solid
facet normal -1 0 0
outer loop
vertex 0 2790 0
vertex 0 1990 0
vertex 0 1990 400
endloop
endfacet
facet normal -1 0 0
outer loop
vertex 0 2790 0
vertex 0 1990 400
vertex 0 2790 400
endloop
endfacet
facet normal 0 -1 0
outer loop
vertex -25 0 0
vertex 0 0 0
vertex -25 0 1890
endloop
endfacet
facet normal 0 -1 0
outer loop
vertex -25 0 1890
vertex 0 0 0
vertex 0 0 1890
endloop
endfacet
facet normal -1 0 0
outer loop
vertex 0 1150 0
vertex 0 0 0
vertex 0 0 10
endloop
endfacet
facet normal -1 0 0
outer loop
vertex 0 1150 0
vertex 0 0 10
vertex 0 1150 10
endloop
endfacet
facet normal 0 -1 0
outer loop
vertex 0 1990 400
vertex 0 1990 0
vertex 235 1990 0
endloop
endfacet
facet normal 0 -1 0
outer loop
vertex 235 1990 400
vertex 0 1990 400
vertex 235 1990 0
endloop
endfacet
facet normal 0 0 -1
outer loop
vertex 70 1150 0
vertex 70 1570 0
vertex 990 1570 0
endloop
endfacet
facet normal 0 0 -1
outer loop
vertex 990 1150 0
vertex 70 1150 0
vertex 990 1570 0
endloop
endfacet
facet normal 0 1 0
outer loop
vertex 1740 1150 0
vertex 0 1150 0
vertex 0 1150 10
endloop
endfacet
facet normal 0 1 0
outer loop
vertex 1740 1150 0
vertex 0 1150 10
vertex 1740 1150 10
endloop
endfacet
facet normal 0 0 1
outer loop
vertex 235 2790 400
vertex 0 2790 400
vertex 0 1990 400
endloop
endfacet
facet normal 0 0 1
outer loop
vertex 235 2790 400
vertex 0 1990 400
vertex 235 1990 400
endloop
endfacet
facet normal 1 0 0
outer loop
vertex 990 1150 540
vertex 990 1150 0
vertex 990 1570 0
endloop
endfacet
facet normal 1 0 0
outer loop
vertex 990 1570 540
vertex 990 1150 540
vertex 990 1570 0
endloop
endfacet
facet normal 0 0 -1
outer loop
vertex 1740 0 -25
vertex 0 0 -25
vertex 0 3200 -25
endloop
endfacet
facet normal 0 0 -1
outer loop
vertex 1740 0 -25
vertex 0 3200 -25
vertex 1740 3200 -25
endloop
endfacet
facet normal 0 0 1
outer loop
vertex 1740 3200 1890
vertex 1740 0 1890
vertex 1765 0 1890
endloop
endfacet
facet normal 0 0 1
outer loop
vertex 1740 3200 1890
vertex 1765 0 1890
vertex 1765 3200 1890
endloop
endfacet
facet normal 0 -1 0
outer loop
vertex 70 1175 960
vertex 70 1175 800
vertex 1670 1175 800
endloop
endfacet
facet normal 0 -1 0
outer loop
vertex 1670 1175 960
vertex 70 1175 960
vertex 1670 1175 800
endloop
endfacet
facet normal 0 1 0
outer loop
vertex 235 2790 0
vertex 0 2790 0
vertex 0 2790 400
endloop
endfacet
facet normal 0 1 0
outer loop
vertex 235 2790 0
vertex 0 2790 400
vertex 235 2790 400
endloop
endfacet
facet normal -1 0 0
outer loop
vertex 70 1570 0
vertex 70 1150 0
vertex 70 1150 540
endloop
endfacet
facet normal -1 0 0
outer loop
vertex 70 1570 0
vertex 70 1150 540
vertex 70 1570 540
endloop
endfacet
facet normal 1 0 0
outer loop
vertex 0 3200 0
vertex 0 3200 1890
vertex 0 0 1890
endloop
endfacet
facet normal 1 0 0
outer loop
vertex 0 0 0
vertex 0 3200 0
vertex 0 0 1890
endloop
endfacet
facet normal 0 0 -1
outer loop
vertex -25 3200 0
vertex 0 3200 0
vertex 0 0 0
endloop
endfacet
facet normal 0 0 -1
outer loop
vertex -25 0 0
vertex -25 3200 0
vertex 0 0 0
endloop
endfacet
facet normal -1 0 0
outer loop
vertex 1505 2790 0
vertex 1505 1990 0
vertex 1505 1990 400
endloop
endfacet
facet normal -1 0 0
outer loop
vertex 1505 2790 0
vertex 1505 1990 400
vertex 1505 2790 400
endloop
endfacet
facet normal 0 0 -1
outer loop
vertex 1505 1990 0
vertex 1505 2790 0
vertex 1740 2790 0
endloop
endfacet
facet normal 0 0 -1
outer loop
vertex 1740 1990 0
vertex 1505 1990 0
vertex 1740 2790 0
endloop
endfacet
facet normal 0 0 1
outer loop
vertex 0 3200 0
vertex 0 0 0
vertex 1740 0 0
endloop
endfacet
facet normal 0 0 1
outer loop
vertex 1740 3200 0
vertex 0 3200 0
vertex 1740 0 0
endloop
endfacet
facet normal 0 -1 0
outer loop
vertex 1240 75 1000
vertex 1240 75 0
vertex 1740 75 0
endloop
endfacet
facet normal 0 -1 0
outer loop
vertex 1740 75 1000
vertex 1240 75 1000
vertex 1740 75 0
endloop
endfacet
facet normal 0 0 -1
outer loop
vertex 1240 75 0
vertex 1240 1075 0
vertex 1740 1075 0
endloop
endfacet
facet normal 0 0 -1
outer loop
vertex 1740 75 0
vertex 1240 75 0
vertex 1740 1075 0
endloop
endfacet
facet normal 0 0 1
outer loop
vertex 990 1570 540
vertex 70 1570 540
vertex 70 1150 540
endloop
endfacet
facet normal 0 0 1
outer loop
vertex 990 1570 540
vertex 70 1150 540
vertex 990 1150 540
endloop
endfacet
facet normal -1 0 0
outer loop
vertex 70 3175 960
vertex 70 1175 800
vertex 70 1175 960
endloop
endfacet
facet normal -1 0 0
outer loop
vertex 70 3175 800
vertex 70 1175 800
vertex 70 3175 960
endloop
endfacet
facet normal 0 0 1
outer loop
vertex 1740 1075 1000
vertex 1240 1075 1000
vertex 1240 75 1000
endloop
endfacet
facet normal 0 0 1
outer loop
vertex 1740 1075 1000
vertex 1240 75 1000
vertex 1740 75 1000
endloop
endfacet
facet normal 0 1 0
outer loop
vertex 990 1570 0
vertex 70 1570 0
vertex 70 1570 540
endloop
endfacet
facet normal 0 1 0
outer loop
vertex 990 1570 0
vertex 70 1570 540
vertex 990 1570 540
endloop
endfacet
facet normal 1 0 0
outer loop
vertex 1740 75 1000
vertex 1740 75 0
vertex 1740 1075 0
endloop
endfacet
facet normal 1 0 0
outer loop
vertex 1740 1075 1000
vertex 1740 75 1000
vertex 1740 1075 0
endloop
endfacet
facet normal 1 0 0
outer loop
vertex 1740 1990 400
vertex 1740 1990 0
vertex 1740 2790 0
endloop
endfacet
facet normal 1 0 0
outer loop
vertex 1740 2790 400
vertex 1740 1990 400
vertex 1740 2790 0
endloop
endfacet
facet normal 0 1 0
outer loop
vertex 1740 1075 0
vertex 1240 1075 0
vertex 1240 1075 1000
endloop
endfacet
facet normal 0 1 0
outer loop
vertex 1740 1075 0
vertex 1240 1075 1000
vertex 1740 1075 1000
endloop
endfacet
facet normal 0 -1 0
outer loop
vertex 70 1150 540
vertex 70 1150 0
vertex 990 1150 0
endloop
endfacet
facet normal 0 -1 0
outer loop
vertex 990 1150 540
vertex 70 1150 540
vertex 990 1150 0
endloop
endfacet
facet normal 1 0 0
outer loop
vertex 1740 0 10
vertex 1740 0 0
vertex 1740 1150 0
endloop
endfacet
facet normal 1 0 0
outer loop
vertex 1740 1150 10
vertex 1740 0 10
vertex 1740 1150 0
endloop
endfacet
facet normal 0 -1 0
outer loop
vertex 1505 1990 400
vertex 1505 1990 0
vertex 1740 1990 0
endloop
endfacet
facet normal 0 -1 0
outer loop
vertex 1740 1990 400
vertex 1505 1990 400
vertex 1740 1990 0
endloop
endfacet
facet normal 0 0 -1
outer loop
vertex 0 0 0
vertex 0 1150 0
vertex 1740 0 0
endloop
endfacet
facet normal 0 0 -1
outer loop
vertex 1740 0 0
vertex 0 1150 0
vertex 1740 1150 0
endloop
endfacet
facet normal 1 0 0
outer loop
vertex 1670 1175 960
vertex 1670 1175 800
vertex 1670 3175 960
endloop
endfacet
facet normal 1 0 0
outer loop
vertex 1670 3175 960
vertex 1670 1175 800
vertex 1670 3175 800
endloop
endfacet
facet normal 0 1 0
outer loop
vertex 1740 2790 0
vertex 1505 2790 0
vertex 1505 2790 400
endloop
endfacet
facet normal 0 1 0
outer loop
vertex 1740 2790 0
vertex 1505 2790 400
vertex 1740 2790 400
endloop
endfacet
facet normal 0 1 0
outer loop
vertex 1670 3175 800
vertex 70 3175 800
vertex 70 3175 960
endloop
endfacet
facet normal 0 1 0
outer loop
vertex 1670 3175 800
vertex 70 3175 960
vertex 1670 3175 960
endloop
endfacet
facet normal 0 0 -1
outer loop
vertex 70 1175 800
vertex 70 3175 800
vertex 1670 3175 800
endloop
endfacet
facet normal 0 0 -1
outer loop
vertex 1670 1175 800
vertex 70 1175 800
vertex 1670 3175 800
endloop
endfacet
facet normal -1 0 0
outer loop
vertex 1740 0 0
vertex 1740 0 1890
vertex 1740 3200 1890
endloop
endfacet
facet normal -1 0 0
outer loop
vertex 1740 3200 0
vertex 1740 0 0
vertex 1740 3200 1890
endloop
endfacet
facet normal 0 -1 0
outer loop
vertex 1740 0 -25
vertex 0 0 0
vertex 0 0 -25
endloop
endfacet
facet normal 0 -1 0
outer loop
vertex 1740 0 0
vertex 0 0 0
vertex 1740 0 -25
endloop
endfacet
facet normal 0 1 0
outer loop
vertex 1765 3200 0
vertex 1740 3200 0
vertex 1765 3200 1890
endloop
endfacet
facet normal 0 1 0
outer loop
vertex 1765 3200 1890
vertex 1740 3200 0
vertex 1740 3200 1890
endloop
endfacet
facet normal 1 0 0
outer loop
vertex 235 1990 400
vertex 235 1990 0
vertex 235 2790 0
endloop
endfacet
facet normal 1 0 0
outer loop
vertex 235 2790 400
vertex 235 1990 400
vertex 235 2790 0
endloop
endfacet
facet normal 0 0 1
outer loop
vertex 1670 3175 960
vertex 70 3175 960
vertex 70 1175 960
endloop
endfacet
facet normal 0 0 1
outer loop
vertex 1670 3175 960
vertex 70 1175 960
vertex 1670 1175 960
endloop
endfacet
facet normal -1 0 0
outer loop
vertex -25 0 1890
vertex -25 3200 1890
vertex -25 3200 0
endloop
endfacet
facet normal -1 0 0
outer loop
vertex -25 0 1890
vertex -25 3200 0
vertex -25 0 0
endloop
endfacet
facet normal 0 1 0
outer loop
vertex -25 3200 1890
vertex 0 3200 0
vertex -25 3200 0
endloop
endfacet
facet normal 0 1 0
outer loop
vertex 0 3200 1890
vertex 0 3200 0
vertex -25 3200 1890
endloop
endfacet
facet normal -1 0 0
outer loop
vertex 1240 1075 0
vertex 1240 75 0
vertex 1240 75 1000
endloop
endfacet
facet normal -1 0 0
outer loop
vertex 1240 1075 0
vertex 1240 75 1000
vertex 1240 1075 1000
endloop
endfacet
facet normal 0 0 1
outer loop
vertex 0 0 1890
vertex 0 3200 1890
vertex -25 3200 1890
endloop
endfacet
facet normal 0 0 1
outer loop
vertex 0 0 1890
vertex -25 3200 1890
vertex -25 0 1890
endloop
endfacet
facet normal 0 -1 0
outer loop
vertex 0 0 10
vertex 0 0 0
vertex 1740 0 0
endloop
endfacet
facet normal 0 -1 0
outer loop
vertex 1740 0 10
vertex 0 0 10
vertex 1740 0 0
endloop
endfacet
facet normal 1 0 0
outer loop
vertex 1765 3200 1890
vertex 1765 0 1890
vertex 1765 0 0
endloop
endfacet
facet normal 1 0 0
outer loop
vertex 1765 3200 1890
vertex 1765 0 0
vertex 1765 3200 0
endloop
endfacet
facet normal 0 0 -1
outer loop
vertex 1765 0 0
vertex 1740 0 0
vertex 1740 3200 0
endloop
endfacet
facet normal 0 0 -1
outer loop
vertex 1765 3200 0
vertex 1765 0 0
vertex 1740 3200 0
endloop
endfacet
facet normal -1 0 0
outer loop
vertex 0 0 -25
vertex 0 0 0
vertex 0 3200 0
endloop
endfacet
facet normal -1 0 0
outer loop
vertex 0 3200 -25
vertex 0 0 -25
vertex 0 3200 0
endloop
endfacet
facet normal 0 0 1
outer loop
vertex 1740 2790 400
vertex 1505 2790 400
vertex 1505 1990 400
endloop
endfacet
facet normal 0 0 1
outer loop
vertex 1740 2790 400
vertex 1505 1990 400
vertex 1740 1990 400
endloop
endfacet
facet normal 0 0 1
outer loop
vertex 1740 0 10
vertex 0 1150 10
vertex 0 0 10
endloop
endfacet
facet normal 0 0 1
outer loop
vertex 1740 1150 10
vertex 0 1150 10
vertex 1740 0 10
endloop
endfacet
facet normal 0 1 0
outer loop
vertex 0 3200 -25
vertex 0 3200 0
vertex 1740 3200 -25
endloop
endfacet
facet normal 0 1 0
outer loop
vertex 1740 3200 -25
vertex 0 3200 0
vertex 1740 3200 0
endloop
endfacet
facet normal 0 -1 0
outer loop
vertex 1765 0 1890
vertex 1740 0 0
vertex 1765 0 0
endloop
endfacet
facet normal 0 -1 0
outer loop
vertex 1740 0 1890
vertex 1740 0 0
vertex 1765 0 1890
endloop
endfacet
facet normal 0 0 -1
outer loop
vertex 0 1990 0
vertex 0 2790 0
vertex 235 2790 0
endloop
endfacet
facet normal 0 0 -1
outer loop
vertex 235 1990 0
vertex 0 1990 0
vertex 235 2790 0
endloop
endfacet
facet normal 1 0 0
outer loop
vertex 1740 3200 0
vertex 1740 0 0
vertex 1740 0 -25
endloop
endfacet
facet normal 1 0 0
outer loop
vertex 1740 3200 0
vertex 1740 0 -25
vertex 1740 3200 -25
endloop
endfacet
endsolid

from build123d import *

# Parameters (mm, degrees)
F0_W      = 1740
F0_H      = 3200
F1_DEPTH  = 25
F2_W      = 3200
F2_H      = 1890
F4_DEPTH  = 25
F3_W      = 3200
F3_H      = 1890
F5_DEPTH  = 25
F6_W      = 1740
F6_H      = 1150
F7_DEPTH  = 10
F8_W      = 235
F8_H      = 800
F9_DEPTH  = 400
F10_W     = 235
F10_H     = 800
F11_DEPTH = 400
F13_W     = 1600
F13_H     = 2000
F14_DEPTH = 160
F15_W     = 500
F15_H     = 1000
F16_DEPTH = 1000
F17_W     = 920
F17_H     = 420
F18_DEPTH = 540


with BuildPart() as f1:
    # F0 (on Top) → F1 (new body)
    with BuildSketch(Plane.XY):
        with Locations((870, 1600)):
            Rectangle(F0_W, F0_H)
    extrude(amount=-F1_DEPTH)


with BuildPart() as f4:
    # F2 (on face) → F4 (new body)
    with BuildSketch(Plane.YZ.offset(1740)):
        with Locations((1600, 945)):
            Rectangle(F2_W, F2_H)
    extrude(amount=F4_DEPTH)


with BuildPart() as f5:
    # F3 (on face) → F5 (new body)
    with BuildSketch(Plane(origin=(0, 0, 0), x_dir=(0, -1, 0), z_dir=(-1, 0, 0))):
        with Locations((-1600, 945)):
            Rectangle(F3_W, F3_H)
    extrude(amount=F5_DEPTH)


with BuildPart() as f7:
    # F6 (on face) → F7 (new body)
    with BuildSketch(Plane.XY):
        with Locations((870, 575)):
            Rectangle(F6_W, F6_H)
    extrude(amount=F7_DEPTH)


with BuildPart() as f9:
    # F8 (on face) → F9 (new body)
    with BuildSketch(Plane.XY):
        with Locations((117.5, 2390)):
            Rectangle(F8_W, F8_H)
    extrude(amount=F9_DEPTH)


with BuildPart() as f11:
    # F10 (on face) → F11 (new body)
    with BuildSketch(Plane.XY):
        with Locations((1622.5, 2390)):
            Rectangle(F10_W, F10_H)
    extrude(amount=F11_DEPTH)


with BuildPart() as f14:
    # F13 (on offset) → F14 (new body)
    with BuildSketch(Plane.XY.offset(800)):
        with Locations((870, 2175)):
            Rectangle(F13_W, F13_H)
    extrude(amount=F14_DEPTH)


with BuildPart() as f16:
    # F15 (on Top) → F16 (new body)
    with BuildSketch(Plane.XY):
        with Locations((1490, 575)):
            Rectangle(F15_W, F15_H)
    extrude(amount=F16_DEPTH)


with BuildPart() as f18:
    # F17 (on face) → F18 (new body)
    with BuildSketch(Plane.XY):
        with Locations((530, 1360)):
            Rectangle(F17_W, F17_H)
    extrude(amount=F18_DEPTH)


solid = Compound([f1.part, f4.part, f5.part, f7.part, f9.part, f11.part, f14.part, f16.part, f18.part])
